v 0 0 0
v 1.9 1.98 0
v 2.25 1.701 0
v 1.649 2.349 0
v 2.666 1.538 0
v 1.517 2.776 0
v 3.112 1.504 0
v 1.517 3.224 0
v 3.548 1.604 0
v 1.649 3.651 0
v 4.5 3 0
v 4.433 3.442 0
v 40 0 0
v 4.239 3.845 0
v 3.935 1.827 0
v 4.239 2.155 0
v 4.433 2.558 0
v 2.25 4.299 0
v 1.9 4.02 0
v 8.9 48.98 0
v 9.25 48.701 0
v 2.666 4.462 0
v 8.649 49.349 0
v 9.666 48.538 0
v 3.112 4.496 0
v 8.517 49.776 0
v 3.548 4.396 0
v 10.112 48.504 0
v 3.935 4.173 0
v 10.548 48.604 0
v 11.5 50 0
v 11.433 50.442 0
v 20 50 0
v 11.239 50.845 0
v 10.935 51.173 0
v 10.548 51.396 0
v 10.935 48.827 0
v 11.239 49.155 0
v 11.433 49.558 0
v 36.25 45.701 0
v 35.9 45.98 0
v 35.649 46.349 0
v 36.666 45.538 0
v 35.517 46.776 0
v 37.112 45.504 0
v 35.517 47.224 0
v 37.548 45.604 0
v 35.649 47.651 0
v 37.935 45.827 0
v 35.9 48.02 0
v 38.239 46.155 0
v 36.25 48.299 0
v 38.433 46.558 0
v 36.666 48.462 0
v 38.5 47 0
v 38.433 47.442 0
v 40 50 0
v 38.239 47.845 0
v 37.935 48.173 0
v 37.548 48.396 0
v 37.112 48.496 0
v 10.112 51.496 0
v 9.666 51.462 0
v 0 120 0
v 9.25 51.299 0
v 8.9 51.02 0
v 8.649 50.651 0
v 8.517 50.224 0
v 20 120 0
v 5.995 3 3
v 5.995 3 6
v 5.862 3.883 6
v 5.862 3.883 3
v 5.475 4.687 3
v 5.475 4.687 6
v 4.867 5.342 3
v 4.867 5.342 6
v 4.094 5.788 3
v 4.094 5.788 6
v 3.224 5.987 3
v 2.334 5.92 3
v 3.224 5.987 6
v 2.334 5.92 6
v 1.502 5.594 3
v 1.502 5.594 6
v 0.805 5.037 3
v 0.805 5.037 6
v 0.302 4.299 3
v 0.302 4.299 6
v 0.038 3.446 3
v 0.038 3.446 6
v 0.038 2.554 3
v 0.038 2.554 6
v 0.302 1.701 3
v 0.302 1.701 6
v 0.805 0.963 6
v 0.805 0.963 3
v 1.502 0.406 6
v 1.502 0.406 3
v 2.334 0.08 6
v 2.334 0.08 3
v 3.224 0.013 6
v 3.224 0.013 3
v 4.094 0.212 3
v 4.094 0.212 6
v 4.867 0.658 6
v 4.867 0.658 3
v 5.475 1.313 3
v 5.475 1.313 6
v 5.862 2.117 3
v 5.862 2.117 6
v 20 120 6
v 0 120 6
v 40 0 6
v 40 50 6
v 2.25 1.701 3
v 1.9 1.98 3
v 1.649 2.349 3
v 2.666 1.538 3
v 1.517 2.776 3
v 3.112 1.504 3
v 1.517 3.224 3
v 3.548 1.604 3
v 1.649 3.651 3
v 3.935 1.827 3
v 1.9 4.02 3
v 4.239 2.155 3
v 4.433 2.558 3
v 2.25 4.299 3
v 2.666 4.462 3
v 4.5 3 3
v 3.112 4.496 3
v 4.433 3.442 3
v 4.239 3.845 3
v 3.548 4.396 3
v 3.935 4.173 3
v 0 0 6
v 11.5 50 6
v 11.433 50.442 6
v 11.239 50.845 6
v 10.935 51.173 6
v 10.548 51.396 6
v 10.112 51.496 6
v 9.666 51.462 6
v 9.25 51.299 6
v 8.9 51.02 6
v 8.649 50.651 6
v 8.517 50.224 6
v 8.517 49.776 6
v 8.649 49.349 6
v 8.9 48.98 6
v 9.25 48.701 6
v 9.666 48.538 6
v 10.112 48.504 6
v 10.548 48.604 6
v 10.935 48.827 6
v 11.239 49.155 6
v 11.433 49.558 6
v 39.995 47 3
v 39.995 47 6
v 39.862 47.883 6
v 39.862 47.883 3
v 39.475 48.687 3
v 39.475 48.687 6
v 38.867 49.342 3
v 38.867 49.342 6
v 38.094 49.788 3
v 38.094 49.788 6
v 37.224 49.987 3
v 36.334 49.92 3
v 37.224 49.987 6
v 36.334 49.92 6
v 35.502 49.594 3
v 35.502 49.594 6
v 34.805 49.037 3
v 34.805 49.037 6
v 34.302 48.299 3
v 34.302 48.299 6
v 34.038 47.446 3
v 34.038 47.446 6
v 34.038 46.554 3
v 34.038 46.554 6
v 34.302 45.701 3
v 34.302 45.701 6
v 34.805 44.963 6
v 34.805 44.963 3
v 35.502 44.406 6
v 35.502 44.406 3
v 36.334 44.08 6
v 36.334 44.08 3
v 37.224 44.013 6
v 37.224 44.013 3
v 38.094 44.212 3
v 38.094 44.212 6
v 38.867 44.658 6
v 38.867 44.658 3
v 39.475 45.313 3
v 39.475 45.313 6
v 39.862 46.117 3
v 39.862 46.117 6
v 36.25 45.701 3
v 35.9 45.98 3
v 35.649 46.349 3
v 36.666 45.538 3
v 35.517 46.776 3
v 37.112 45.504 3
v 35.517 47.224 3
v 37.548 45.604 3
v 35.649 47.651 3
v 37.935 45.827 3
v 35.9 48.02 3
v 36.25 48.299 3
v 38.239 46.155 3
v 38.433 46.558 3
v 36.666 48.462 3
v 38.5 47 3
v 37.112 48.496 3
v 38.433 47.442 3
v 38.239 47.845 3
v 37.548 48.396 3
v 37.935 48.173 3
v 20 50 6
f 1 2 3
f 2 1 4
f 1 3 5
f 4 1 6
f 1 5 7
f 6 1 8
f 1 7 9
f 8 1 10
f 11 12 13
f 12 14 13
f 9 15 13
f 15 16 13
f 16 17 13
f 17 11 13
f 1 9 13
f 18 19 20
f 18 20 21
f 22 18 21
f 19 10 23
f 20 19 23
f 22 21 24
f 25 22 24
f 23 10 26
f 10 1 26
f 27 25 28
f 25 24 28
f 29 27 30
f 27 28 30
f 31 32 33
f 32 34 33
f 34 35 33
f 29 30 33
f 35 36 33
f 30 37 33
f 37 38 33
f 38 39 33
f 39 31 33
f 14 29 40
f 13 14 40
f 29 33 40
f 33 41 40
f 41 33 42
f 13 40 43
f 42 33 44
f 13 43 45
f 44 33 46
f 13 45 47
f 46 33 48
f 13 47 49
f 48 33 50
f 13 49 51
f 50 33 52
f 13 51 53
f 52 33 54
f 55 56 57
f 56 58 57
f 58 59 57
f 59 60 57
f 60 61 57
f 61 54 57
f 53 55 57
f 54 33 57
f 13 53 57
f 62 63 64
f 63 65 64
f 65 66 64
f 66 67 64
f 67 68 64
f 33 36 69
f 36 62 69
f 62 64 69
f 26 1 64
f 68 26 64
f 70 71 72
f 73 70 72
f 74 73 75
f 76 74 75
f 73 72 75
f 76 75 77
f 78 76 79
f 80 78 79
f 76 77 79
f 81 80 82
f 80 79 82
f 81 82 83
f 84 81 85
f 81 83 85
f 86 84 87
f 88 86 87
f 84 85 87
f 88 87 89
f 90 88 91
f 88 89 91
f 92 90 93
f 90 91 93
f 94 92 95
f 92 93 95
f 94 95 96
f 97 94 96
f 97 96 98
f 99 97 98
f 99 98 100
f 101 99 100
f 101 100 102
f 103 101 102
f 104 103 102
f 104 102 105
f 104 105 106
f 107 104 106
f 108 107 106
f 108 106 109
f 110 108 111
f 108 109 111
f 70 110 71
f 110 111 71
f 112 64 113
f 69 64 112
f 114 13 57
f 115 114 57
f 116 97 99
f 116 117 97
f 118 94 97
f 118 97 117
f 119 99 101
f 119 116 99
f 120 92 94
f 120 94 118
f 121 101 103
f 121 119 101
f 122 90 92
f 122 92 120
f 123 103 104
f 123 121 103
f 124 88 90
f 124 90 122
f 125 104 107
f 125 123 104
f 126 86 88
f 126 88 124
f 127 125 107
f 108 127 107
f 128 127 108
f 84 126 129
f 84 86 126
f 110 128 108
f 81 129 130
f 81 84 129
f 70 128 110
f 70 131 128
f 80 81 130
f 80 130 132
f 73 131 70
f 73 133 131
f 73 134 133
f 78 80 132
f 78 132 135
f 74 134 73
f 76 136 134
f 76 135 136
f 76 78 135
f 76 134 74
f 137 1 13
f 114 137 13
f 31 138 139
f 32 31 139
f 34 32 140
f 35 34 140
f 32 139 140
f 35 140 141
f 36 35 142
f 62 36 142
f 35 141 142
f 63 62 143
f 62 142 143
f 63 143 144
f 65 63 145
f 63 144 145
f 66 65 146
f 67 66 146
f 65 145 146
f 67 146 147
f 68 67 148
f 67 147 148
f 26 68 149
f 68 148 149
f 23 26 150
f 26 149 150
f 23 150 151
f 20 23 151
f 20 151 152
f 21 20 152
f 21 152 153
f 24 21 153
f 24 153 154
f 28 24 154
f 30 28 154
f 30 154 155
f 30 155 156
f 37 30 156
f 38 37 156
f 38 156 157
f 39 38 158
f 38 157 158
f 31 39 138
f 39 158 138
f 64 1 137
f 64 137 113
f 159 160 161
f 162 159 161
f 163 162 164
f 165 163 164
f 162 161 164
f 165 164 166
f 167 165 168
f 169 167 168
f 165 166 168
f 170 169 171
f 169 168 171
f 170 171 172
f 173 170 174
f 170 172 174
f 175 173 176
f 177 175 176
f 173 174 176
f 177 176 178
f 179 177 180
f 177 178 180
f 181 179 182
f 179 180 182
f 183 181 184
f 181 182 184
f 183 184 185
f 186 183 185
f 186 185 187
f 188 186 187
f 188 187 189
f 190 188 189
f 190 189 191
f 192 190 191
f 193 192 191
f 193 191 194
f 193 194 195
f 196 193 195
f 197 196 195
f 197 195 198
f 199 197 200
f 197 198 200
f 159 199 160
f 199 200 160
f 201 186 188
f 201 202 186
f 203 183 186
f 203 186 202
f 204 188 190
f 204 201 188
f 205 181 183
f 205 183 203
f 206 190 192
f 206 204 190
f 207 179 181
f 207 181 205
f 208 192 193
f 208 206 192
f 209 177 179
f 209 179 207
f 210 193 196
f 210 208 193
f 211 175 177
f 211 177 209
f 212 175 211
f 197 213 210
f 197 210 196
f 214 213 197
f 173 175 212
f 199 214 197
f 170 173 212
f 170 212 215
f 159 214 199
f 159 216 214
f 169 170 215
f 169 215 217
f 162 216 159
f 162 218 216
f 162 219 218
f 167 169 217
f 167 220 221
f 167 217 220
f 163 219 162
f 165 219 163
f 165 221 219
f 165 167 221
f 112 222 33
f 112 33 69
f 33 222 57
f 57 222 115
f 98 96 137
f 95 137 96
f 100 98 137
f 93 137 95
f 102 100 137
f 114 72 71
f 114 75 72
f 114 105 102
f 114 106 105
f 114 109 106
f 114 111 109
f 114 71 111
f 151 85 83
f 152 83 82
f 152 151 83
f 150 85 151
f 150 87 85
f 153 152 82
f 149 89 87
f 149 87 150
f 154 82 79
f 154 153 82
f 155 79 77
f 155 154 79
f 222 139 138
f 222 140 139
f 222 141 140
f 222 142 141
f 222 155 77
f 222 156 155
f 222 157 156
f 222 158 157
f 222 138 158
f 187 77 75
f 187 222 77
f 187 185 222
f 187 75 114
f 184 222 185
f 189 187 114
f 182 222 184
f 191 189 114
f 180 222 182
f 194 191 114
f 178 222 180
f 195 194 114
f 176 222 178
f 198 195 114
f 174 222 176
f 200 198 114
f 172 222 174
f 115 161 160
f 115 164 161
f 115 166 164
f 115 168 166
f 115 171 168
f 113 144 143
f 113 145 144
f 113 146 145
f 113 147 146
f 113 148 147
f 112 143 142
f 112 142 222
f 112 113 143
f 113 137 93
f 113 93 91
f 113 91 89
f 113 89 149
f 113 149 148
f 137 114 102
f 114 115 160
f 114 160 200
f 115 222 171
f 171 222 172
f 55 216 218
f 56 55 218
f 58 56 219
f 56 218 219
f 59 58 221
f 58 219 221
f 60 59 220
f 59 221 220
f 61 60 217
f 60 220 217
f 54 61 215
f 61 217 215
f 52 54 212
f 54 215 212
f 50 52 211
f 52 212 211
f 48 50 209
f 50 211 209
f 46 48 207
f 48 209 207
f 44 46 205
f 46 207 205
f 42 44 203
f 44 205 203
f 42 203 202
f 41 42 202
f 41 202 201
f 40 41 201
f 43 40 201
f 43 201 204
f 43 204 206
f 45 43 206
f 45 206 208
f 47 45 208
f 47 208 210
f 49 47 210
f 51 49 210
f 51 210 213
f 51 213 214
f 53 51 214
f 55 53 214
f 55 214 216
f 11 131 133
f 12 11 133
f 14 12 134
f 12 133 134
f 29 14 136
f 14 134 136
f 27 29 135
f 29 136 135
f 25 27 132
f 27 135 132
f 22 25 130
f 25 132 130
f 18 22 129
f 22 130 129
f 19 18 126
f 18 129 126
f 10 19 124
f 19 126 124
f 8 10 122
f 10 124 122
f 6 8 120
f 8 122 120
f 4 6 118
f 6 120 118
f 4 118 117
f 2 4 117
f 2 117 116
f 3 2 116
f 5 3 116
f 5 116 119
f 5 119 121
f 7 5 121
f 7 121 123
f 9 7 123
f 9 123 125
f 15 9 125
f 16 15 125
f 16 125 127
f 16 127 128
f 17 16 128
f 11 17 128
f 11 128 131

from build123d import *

# Parameters (mm, degrees)
ESQUISSE1_W             = 40
ESQUISSE1_H             = 120
BOSS_EXTRU_1_DEPTH      = 6
ESQUISSE2_W             = 20
ESQUISSE2_H             = 70
ENL_V_MAT_EXTRU_1_DEPTH = 6
ESQUISSE3_R             = 1.5
ENL_V_MAT_EXTRU_2_DEPTH = 6
ESQUISSE4_R             = 2.995
ENL_V_MAT_EXTRU_3_DEPTH = 3
ESQUISSE6_R             = 1.5
ENL_V_MAT_EXTRU_4_DEPTH = 6


with BuildPart() as part:
    # Esquisse1 → Boss.-Extru.1 (new body)
    with BuildSketch(Plane.XY):
        with Locations((20, 60)):
            Rectangle(ESQUISSE1_W, ESQUISSE1_H)
    extrude(amount=BOSS_EXTRU_1_DEPTH)

    # Esquisse2 → Enlèv. mat.-Extru.1 (cut)
    with BuildSketch(Plane.XY.offset(6)):
        with Locations((30, 85)):
            Rectangle(ESQUISSE2_W, ESQUISSE2_H)
    extrude(amount=-ENL_V_MAT_EXTRU_1_DEPTH, mode=Mode.SUBTRACT)

    # Esquisse3 → Enlèv. mat.-Extru.2 (cut)
    with BuildSketch(Plane.XY.offset(6)):
        with Locations((3, 3)):
            Circle(ESQUISSE3_R)
        with Locations((37, 47)):
            Circle(ESQUISSE3_R)
    extrude(amount=-ENL_V_MAT_EXTRU_2_DEPTH, mode=Mode.SUBTRACT)

    # Esquisse4 → Enlèv. mat.-Extru.3 (cut)
    with BuildSketch(Plane.XY.offset(6)):
        with Locations((3, 3)):
            Circle(ESQUISSE4_R)
        with Locations((37, 47)):
            Circle(ESQUISSE4_R)
    extrude(amount=-ENL_V_MAT_EXTRU_3_DEPTH, mode=Mode.SUBTRACT)

    # Esquisse6 → Enlèv. mat.-Extru.4 (cut)
    with BuildSketch(Plane.XY.offset(6)):
        with Locations((10, 50)):
            Circle(ESQUISSE6_R)
    extrude(amount=-ENL_V_MAT_EXTRU_4_DEPTH, mode=Mode.SUBTRACT)


solid = part.part
